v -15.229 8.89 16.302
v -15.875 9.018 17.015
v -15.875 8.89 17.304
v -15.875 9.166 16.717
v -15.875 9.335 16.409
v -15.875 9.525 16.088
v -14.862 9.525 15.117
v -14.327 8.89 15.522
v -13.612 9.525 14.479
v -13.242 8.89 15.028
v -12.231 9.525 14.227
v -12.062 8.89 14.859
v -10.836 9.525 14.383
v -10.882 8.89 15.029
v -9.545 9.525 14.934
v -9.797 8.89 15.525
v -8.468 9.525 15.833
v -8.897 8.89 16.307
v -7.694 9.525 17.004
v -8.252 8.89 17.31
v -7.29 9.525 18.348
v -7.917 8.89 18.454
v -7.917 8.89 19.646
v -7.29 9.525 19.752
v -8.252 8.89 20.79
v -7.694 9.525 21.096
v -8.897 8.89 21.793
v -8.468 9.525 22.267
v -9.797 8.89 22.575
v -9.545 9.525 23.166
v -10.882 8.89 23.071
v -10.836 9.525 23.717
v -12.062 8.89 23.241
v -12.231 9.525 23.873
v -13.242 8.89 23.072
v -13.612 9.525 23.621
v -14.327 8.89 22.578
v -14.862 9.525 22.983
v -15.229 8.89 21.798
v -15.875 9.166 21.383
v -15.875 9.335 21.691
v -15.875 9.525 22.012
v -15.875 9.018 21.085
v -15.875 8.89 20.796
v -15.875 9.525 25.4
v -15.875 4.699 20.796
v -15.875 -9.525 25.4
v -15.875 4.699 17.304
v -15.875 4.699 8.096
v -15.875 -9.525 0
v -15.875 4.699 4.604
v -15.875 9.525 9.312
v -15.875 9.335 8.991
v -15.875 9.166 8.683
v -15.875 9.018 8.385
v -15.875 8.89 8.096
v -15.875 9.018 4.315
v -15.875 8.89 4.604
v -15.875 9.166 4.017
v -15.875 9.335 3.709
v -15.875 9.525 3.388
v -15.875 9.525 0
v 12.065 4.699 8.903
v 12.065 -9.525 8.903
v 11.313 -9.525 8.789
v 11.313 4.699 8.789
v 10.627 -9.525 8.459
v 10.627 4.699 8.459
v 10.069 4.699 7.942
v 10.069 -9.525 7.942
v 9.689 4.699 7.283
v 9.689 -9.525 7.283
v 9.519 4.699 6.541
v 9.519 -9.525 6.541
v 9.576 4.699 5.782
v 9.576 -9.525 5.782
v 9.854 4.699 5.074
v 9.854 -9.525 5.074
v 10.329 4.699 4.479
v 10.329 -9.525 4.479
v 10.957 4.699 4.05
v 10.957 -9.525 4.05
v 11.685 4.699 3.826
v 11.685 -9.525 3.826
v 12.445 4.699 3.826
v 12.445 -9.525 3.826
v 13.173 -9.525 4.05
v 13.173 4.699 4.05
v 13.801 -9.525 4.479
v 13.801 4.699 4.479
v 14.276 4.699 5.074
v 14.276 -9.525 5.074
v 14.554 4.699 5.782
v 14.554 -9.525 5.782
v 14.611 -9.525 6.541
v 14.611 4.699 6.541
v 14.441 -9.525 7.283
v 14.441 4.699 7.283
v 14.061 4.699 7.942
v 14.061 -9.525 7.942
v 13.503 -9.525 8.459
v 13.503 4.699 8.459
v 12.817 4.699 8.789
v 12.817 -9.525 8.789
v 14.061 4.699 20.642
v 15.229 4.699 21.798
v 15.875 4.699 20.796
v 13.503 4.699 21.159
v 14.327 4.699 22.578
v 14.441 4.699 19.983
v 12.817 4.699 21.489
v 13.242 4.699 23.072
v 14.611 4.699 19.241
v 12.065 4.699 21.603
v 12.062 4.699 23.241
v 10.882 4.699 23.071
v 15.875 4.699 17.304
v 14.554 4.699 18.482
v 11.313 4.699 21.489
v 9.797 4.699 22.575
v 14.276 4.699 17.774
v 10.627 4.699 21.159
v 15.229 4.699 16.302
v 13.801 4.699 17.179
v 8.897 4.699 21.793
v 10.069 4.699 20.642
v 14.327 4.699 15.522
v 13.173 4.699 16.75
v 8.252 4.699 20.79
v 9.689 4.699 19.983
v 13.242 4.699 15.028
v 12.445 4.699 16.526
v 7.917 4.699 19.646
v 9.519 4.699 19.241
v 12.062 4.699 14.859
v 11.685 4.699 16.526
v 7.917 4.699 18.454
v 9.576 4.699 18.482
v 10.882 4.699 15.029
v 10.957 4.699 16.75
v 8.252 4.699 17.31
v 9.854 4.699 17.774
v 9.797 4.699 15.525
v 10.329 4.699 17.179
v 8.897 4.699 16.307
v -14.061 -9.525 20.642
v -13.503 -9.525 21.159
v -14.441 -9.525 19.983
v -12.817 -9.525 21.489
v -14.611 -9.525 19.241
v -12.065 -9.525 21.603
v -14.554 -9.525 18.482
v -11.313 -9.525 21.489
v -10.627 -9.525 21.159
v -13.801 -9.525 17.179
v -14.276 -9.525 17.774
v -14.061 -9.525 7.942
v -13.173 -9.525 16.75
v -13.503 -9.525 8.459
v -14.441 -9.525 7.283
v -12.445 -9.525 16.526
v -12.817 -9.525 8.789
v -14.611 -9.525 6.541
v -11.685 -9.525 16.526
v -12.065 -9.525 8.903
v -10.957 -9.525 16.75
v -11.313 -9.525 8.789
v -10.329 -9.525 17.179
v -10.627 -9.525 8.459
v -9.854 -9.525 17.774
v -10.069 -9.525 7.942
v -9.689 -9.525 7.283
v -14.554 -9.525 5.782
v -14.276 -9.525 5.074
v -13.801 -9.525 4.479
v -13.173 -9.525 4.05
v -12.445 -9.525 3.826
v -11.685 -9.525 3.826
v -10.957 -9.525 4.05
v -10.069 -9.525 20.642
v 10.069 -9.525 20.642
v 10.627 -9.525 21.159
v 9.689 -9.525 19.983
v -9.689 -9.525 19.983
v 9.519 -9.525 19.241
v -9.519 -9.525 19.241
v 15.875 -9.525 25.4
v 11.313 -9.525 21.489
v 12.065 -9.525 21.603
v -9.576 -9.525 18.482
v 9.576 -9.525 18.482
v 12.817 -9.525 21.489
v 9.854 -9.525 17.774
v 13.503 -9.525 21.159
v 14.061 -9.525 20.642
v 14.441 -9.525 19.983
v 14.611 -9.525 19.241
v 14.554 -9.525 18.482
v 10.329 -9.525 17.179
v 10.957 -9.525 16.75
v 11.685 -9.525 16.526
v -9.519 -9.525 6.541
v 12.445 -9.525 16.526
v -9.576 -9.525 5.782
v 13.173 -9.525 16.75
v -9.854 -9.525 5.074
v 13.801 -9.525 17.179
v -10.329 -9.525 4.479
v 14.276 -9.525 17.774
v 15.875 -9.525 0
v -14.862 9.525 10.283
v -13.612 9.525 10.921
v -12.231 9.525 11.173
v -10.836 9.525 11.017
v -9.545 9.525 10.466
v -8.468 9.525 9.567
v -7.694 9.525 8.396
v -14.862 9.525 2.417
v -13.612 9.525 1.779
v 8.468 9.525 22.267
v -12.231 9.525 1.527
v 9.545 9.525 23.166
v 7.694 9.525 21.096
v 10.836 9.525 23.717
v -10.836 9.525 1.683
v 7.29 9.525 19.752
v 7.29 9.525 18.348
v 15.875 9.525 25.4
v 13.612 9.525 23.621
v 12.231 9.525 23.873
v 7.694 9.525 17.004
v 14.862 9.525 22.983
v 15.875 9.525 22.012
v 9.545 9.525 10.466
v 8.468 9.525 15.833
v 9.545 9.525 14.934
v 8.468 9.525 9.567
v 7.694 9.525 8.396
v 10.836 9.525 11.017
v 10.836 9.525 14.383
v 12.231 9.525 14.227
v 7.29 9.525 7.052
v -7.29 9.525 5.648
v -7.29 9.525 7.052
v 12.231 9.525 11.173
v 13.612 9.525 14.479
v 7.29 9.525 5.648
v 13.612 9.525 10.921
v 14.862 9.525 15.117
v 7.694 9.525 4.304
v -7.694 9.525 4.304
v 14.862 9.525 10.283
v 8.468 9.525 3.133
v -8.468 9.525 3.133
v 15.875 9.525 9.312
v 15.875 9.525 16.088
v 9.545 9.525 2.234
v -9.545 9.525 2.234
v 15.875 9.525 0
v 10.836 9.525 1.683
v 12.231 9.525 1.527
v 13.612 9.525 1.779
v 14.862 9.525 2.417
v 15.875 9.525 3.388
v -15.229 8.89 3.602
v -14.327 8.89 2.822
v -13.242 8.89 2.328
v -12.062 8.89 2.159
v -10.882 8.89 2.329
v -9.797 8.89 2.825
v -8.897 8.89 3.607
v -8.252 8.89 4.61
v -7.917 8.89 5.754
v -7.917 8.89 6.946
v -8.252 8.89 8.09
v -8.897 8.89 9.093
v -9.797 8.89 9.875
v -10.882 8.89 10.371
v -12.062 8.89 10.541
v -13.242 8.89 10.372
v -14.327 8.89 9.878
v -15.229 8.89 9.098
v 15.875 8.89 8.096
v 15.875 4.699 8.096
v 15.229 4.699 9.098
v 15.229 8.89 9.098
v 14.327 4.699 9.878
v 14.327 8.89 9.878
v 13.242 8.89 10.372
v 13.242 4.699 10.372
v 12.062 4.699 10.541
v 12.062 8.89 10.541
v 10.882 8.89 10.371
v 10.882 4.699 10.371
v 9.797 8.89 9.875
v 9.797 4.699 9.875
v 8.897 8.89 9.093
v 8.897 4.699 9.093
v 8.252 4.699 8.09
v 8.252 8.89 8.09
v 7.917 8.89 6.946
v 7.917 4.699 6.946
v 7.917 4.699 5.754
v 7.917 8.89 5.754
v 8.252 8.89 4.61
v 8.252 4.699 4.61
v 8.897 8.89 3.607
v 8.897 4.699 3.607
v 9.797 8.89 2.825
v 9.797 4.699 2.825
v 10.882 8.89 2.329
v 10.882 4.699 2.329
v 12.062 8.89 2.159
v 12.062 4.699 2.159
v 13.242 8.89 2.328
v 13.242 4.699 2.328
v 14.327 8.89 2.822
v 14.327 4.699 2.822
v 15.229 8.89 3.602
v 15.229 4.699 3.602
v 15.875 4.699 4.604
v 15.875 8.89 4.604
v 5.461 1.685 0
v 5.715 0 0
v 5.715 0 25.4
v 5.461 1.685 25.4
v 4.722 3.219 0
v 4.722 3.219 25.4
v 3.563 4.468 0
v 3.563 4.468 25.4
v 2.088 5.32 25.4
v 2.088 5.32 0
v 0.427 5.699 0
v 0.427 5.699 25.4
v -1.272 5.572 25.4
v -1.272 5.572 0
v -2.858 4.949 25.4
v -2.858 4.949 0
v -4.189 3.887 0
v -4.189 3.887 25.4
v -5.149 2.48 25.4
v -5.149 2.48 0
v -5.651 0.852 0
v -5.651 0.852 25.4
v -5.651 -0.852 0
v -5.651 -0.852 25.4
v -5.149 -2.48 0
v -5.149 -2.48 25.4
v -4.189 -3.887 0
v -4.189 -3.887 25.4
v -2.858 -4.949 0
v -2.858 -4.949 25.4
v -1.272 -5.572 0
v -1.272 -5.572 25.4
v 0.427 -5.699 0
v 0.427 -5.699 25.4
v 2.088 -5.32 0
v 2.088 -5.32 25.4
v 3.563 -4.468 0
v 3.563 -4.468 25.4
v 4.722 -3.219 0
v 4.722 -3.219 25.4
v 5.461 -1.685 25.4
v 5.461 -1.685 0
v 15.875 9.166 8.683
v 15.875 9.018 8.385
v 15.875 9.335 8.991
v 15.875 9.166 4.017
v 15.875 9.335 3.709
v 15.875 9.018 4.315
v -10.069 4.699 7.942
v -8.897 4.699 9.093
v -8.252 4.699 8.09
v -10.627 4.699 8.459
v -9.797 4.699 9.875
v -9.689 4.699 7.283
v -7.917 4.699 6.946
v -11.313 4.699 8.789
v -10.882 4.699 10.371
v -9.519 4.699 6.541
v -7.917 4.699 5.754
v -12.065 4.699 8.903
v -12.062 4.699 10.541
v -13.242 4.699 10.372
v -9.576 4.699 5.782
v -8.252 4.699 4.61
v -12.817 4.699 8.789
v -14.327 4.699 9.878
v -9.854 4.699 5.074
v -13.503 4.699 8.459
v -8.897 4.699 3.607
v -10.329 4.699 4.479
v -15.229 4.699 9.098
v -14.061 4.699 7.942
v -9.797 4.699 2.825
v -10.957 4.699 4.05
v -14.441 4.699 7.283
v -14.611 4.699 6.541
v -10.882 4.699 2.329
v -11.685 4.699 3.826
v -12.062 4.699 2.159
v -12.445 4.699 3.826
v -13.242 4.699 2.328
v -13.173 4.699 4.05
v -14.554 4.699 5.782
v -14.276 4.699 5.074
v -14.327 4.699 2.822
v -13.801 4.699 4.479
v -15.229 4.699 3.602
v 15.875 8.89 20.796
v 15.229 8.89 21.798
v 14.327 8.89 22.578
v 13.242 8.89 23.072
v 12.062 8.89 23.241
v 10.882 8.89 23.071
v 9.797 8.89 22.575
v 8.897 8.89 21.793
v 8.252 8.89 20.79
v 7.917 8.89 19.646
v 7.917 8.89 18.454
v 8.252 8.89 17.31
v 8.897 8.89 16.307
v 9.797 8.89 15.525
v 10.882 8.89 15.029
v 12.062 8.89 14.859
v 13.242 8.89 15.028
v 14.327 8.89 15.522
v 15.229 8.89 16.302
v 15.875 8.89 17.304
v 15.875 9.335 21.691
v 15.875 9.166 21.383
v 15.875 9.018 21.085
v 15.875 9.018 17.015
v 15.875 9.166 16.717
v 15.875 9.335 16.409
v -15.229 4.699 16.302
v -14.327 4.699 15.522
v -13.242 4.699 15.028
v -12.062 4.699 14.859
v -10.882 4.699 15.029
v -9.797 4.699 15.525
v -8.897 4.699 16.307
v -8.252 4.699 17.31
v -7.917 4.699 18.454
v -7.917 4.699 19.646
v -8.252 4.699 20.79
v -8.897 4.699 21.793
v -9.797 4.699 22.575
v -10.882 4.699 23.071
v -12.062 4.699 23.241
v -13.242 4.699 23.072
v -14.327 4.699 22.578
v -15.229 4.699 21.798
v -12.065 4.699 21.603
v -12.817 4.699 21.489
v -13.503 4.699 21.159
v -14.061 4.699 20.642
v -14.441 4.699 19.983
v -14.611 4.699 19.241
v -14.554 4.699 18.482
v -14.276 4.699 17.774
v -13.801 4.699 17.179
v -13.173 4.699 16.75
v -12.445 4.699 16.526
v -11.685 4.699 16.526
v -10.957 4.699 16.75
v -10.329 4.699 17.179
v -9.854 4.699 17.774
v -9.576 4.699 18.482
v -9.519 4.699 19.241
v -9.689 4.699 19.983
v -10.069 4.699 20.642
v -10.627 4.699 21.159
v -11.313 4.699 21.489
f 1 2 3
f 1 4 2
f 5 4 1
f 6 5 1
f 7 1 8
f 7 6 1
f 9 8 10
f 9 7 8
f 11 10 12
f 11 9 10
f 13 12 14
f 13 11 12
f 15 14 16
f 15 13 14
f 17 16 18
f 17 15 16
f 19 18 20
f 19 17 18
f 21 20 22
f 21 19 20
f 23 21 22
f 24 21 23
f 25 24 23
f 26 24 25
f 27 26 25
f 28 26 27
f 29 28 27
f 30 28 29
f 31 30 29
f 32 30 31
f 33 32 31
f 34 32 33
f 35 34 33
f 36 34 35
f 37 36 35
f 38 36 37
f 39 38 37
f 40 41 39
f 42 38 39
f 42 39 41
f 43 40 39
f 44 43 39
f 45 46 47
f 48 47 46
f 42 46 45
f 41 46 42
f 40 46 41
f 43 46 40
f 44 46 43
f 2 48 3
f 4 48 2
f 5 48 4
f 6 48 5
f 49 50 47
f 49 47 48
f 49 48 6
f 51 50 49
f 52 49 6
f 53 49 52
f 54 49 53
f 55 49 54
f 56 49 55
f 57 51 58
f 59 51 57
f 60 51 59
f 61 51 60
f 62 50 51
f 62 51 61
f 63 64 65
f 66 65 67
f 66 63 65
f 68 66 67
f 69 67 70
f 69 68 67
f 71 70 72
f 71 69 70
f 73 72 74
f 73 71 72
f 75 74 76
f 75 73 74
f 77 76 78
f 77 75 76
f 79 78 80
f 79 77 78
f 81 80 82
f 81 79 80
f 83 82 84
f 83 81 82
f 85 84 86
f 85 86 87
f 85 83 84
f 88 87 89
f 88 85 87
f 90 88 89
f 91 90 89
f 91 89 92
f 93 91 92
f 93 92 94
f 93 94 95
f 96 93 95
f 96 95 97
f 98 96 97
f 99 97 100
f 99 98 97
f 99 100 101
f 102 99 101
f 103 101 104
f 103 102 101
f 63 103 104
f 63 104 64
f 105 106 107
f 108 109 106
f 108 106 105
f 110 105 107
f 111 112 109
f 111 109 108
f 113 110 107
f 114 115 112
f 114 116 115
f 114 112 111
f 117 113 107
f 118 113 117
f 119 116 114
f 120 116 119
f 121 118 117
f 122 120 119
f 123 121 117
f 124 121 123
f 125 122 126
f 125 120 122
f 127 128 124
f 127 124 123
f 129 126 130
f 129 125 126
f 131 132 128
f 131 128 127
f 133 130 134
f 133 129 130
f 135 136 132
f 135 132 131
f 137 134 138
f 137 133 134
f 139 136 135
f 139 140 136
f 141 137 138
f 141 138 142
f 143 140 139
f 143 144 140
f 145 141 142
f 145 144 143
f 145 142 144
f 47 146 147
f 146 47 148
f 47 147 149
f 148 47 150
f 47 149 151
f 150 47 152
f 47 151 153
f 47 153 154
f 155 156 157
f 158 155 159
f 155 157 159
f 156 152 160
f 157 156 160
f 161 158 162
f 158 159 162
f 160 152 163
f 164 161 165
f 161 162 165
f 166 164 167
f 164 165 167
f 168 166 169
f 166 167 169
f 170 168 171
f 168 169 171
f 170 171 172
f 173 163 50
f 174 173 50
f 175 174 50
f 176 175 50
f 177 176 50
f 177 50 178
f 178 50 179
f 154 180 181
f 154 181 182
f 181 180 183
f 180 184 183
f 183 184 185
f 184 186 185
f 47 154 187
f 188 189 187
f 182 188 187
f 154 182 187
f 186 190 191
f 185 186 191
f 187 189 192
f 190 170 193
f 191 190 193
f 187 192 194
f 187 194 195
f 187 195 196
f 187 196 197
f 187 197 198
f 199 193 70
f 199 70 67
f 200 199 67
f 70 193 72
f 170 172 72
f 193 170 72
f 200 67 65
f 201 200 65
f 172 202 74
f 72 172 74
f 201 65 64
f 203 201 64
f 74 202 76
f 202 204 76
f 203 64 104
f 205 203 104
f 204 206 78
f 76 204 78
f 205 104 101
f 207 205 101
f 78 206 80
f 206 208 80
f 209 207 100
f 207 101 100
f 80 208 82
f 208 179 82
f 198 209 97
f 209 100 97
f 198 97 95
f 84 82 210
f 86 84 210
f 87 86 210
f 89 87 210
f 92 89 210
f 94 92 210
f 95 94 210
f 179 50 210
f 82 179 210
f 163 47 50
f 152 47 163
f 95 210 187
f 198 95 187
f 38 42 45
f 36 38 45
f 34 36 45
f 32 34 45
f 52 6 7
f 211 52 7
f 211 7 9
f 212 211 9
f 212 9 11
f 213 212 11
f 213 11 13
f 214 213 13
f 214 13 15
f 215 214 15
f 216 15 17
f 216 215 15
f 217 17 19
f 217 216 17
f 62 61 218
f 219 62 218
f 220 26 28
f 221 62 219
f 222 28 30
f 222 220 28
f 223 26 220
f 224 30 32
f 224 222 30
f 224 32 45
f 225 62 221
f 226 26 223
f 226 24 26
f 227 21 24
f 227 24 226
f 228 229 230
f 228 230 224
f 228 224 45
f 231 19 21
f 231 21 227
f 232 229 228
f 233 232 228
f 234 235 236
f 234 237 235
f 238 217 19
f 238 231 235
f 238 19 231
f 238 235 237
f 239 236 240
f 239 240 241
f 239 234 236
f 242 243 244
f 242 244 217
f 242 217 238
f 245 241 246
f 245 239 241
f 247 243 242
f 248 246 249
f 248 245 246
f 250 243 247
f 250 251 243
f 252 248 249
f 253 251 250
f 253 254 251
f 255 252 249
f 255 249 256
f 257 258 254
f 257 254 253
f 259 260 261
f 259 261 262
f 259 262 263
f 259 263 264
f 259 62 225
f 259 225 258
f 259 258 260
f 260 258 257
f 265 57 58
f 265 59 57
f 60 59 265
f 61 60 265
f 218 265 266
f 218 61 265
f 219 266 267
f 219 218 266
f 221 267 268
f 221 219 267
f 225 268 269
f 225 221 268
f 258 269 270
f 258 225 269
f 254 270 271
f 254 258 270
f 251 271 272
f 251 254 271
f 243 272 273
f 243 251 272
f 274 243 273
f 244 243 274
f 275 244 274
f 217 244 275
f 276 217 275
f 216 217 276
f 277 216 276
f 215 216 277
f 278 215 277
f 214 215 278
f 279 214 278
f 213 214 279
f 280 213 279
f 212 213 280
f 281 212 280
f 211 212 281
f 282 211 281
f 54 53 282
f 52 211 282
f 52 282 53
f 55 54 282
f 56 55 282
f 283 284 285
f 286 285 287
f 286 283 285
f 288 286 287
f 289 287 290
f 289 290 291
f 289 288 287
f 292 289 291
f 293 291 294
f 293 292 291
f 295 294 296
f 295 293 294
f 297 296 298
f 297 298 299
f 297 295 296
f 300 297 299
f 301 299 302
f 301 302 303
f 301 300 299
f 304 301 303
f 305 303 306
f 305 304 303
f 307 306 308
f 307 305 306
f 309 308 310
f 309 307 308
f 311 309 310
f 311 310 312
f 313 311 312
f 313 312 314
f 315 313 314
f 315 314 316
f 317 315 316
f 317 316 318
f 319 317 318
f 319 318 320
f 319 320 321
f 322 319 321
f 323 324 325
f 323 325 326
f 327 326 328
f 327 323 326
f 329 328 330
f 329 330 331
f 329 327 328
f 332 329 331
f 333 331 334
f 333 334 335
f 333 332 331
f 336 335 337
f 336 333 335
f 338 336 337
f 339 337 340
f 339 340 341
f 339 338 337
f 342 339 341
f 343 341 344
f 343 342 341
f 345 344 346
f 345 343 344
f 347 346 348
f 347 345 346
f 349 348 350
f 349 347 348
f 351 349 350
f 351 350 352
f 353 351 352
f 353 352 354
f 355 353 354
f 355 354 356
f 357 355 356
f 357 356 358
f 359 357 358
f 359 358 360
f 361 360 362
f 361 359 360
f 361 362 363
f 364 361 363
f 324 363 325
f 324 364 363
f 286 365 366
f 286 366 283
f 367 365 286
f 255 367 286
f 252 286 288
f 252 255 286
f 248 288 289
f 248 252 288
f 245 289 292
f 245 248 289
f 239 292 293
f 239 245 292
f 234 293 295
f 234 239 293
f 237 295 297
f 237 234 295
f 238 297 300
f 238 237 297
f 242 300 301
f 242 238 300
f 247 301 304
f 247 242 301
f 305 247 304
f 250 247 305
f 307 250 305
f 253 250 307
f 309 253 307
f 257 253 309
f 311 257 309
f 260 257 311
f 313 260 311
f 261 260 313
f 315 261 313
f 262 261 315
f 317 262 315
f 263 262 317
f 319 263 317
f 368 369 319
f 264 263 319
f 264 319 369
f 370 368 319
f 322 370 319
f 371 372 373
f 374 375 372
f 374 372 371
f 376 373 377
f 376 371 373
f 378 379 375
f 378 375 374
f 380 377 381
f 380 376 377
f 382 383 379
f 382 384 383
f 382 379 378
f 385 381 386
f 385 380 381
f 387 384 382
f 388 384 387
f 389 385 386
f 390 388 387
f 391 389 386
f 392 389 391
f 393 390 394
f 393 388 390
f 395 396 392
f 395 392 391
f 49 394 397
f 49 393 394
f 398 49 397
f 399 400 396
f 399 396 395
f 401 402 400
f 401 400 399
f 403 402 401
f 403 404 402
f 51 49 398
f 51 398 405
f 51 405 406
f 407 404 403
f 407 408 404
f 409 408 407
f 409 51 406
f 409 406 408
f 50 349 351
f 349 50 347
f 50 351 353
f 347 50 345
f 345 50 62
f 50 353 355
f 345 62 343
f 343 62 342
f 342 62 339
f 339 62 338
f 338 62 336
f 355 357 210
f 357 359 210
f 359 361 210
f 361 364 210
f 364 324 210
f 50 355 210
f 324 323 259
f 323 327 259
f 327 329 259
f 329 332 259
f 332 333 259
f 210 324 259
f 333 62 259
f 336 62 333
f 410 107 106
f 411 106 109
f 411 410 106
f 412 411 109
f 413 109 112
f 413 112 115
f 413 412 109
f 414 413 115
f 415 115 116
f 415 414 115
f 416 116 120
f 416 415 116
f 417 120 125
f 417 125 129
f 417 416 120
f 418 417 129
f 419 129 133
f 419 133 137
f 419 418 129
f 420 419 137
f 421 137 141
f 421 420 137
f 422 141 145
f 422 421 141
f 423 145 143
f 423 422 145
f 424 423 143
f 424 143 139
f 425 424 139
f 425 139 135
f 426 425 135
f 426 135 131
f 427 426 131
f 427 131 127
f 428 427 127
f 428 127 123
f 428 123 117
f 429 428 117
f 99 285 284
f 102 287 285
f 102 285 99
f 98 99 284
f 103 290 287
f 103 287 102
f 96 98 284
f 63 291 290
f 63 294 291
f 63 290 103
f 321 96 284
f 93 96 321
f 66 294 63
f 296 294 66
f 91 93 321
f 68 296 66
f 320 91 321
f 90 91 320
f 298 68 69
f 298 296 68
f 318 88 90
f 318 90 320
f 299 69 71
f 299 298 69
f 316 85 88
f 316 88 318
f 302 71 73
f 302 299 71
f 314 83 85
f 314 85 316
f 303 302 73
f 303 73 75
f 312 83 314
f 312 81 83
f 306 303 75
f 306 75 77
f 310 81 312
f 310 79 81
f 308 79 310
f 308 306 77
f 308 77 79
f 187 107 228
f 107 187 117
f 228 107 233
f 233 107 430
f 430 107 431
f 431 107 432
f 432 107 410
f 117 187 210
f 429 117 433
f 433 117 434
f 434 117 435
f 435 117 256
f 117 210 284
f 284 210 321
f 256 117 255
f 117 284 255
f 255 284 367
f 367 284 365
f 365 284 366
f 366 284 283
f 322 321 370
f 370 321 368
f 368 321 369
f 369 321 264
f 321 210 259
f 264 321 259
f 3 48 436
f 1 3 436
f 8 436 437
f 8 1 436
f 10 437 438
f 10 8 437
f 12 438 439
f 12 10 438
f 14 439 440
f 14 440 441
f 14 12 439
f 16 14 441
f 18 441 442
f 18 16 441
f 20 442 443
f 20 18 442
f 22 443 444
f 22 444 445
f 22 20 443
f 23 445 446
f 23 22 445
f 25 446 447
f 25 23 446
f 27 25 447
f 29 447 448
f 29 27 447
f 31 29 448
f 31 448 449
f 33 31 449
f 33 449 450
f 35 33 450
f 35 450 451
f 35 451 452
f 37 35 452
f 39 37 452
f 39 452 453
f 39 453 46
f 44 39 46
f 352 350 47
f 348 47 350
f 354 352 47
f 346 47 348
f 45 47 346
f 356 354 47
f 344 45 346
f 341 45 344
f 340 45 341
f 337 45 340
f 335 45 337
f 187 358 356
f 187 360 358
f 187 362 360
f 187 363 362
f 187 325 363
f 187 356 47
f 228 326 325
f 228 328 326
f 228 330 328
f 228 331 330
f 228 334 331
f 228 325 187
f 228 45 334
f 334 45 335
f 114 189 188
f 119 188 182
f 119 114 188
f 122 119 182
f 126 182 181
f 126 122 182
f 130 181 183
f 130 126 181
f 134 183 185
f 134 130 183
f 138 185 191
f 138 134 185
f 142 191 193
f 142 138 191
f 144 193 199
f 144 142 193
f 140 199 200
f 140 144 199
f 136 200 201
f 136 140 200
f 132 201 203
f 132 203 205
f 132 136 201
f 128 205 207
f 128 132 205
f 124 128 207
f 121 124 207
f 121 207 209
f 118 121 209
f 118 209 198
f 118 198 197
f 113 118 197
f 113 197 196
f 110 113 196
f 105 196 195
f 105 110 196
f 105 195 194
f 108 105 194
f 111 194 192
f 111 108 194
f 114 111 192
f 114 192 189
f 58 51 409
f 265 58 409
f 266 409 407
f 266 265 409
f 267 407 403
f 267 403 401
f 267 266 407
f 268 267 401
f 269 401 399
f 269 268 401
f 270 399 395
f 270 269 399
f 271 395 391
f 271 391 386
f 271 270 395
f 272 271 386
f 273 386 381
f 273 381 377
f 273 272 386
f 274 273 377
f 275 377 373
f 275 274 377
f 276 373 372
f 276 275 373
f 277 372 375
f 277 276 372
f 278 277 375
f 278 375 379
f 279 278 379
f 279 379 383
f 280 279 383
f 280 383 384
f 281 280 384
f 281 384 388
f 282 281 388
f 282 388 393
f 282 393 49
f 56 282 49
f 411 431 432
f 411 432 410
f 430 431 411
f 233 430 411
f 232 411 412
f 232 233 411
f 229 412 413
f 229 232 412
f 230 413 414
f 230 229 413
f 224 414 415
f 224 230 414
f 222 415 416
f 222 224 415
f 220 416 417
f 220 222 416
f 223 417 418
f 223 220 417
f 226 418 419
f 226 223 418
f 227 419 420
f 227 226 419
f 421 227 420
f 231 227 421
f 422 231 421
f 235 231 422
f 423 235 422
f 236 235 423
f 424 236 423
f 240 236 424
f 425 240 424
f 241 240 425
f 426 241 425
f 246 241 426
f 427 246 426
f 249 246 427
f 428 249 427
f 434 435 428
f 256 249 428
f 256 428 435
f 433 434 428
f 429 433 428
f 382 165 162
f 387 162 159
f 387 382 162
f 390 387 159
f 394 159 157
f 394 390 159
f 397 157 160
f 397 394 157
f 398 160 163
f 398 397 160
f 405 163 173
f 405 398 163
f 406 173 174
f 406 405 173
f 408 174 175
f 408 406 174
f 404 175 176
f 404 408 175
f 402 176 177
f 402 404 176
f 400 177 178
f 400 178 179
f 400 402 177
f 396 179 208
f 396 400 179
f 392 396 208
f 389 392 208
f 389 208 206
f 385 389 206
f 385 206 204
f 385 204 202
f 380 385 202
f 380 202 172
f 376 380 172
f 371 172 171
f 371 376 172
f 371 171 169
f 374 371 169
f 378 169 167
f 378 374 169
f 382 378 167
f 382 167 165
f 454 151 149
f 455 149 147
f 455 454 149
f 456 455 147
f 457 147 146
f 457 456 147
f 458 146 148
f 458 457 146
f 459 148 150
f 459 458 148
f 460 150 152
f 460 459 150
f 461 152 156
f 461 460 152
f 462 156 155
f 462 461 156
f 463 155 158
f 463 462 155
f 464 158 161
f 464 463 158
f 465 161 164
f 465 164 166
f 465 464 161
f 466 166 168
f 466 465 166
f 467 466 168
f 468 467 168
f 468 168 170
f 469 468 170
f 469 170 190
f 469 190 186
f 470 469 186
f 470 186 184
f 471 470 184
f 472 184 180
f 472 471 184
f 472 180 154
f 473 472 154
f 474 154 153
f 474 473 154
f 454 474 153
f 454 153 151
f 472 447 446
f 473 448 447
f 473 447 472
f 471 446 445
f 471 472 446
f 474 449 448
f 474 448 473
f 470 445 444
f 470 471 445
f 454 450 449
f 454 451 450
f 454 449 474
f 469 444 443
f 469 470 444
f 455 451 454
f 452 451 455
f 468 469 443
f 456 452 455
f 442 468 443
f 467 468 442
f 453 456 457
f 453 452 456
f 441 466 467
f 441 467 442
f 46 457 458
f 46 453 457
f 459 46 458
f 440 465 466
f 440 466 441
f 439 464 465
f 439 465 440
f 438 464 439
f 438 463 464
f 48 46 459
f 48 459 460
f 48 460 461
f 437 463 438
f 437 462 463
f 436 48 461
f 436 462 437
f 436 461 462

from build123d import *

# Parameters (mm, degrees)
SKETCH1_R                                    = 18.669
SKETCH1_R_2                                  = 5.715
NUT_BODY_EXTRUDE_DEPTH                       = 25.4
SKETCH2_R                                    = 18.669
SKETCH2_W                                    = 31.75
SKETCH2_H                                    = 19.05
NUT_TRIM_CUT_EXTRUDE_DEPTH                   = 37.636363384
CBORE_FOR_10_SOCKET_HEAD_CAP_SCREW1_AT_COUNT = 2
CBORE_FOR_10_SOCKET_HEAD_CAP_SCREW1_AT_PITCH = 12.7
CBORE_FOR_10_SOCKET_HEAD_CAP_SCREW1_2_COUNT  = 2
CBORE_FOR_10_SOCKET_HEAD_CAP_SCREW1_2_PITCH  = 27.268056403
CBORE_FOR_10_SOCKET_HEAD_CAP_SCREW1_3_COUNT  = 2
CBORE_FOR_10_SOCKET_HEAD_CAP_SCREW1_3_PITCH  = 24.13


with BuildPart() as part:
    # Sketch1 → nut-body-extrude (new body)
    with BuildSketch(Plane.XY):
        Circle(SKETCH1_R)
        Circle(SKETCH1_R_2, mode=Mode.SUBTRACT)
    extrude(amount=NUT_BODY_EXTRUDE_DEPTH)

    # Sketch2 → nut-trim-cut-extrude (cut, through all)
    with BuildSketch(Plane.XY):
        Circle(SKETCH2_R)
        Rectangle(SKETCH2_W, SKETCH2_H, mode=Mode.SUBTRACT)
    extrude(amount=NUT_TRIM_CUT_EXTRUDE_DEPTH, mode=Mode.SUBTRACT)

    # Sketch4 → CBORE for #10 Socket Head Cap Screw1 (revolve, cut)
    with BuildSketch(Plane(origin=(12.065, 9.525, 6.35), x_dir=(0, 0, 1), z_dir=(1, 0, 0))):
        Polygon((0, 0), (0, 19.05), (2.5527, 19.05), (2.5527, 4.826), (4.191, 4.826), (4.191, 0.635), (4.826, 0), align=None)
    cbore_for_10_socket_head_cap_screw1 = revolve(axis=Axis((12.065, 15.875, 6.35), (0, -1, 0)), mode=Mode.SUBTRACT)

    # CBORE for #10 Socket Head Cap Screw1 at: CBORE for #10 Socket Head Cap Screw1 ×2
    with Locations(*[(0, 0, i * CBORE_FOR_10_SOCKET_HEAD_CAP_SCREW1_AT_PITCH) for i in range(1, CBORE_FOR_10_SOCKET_HEAD_CAP_SCREW1_AT_COUNT)]):
        add(cbore_for_10_socket_head_cap_screw1, mode=Mode.SUBTRACT)

    # CBORE for _10 Socket Head Cap Screw1 2: CBORE for #10 Socket Head Cap Screw1 ×2
    with Locations(*[Vector(-0.8849182223819826, 0, 0.46574643283262207) * (i * CBORE_FOR_10_SOCKET_HEAD_CAP_SCREW1_2_PITCH) for i in range(1, CBORE_FOR_10_SOCKET_HEAD_CAP_SCREW1_2_COUNT)]):
        add(cbore_for_10_socket_head_cap_screw1, mode=Mode.SUBTRACT)

    # CBORE for _10 Socket Head Cap Screw1 3: CBORE for #10 Socket Head Cap Screw1 ×2
    with Locations(*[(-i * CBORE_FOR_10_SOCKET_HEAD_CAP_SCREW1_3_PITCH, 0, 0) for i in range(1, CBORE_FOR_10_SOCKET_HEAD_CAP_SCREW1_3_COUNT)]):
        add(cbore_for_10_socket_head_cap_screw1, mode=Mode.SUBTRACT)


solid = part.part
